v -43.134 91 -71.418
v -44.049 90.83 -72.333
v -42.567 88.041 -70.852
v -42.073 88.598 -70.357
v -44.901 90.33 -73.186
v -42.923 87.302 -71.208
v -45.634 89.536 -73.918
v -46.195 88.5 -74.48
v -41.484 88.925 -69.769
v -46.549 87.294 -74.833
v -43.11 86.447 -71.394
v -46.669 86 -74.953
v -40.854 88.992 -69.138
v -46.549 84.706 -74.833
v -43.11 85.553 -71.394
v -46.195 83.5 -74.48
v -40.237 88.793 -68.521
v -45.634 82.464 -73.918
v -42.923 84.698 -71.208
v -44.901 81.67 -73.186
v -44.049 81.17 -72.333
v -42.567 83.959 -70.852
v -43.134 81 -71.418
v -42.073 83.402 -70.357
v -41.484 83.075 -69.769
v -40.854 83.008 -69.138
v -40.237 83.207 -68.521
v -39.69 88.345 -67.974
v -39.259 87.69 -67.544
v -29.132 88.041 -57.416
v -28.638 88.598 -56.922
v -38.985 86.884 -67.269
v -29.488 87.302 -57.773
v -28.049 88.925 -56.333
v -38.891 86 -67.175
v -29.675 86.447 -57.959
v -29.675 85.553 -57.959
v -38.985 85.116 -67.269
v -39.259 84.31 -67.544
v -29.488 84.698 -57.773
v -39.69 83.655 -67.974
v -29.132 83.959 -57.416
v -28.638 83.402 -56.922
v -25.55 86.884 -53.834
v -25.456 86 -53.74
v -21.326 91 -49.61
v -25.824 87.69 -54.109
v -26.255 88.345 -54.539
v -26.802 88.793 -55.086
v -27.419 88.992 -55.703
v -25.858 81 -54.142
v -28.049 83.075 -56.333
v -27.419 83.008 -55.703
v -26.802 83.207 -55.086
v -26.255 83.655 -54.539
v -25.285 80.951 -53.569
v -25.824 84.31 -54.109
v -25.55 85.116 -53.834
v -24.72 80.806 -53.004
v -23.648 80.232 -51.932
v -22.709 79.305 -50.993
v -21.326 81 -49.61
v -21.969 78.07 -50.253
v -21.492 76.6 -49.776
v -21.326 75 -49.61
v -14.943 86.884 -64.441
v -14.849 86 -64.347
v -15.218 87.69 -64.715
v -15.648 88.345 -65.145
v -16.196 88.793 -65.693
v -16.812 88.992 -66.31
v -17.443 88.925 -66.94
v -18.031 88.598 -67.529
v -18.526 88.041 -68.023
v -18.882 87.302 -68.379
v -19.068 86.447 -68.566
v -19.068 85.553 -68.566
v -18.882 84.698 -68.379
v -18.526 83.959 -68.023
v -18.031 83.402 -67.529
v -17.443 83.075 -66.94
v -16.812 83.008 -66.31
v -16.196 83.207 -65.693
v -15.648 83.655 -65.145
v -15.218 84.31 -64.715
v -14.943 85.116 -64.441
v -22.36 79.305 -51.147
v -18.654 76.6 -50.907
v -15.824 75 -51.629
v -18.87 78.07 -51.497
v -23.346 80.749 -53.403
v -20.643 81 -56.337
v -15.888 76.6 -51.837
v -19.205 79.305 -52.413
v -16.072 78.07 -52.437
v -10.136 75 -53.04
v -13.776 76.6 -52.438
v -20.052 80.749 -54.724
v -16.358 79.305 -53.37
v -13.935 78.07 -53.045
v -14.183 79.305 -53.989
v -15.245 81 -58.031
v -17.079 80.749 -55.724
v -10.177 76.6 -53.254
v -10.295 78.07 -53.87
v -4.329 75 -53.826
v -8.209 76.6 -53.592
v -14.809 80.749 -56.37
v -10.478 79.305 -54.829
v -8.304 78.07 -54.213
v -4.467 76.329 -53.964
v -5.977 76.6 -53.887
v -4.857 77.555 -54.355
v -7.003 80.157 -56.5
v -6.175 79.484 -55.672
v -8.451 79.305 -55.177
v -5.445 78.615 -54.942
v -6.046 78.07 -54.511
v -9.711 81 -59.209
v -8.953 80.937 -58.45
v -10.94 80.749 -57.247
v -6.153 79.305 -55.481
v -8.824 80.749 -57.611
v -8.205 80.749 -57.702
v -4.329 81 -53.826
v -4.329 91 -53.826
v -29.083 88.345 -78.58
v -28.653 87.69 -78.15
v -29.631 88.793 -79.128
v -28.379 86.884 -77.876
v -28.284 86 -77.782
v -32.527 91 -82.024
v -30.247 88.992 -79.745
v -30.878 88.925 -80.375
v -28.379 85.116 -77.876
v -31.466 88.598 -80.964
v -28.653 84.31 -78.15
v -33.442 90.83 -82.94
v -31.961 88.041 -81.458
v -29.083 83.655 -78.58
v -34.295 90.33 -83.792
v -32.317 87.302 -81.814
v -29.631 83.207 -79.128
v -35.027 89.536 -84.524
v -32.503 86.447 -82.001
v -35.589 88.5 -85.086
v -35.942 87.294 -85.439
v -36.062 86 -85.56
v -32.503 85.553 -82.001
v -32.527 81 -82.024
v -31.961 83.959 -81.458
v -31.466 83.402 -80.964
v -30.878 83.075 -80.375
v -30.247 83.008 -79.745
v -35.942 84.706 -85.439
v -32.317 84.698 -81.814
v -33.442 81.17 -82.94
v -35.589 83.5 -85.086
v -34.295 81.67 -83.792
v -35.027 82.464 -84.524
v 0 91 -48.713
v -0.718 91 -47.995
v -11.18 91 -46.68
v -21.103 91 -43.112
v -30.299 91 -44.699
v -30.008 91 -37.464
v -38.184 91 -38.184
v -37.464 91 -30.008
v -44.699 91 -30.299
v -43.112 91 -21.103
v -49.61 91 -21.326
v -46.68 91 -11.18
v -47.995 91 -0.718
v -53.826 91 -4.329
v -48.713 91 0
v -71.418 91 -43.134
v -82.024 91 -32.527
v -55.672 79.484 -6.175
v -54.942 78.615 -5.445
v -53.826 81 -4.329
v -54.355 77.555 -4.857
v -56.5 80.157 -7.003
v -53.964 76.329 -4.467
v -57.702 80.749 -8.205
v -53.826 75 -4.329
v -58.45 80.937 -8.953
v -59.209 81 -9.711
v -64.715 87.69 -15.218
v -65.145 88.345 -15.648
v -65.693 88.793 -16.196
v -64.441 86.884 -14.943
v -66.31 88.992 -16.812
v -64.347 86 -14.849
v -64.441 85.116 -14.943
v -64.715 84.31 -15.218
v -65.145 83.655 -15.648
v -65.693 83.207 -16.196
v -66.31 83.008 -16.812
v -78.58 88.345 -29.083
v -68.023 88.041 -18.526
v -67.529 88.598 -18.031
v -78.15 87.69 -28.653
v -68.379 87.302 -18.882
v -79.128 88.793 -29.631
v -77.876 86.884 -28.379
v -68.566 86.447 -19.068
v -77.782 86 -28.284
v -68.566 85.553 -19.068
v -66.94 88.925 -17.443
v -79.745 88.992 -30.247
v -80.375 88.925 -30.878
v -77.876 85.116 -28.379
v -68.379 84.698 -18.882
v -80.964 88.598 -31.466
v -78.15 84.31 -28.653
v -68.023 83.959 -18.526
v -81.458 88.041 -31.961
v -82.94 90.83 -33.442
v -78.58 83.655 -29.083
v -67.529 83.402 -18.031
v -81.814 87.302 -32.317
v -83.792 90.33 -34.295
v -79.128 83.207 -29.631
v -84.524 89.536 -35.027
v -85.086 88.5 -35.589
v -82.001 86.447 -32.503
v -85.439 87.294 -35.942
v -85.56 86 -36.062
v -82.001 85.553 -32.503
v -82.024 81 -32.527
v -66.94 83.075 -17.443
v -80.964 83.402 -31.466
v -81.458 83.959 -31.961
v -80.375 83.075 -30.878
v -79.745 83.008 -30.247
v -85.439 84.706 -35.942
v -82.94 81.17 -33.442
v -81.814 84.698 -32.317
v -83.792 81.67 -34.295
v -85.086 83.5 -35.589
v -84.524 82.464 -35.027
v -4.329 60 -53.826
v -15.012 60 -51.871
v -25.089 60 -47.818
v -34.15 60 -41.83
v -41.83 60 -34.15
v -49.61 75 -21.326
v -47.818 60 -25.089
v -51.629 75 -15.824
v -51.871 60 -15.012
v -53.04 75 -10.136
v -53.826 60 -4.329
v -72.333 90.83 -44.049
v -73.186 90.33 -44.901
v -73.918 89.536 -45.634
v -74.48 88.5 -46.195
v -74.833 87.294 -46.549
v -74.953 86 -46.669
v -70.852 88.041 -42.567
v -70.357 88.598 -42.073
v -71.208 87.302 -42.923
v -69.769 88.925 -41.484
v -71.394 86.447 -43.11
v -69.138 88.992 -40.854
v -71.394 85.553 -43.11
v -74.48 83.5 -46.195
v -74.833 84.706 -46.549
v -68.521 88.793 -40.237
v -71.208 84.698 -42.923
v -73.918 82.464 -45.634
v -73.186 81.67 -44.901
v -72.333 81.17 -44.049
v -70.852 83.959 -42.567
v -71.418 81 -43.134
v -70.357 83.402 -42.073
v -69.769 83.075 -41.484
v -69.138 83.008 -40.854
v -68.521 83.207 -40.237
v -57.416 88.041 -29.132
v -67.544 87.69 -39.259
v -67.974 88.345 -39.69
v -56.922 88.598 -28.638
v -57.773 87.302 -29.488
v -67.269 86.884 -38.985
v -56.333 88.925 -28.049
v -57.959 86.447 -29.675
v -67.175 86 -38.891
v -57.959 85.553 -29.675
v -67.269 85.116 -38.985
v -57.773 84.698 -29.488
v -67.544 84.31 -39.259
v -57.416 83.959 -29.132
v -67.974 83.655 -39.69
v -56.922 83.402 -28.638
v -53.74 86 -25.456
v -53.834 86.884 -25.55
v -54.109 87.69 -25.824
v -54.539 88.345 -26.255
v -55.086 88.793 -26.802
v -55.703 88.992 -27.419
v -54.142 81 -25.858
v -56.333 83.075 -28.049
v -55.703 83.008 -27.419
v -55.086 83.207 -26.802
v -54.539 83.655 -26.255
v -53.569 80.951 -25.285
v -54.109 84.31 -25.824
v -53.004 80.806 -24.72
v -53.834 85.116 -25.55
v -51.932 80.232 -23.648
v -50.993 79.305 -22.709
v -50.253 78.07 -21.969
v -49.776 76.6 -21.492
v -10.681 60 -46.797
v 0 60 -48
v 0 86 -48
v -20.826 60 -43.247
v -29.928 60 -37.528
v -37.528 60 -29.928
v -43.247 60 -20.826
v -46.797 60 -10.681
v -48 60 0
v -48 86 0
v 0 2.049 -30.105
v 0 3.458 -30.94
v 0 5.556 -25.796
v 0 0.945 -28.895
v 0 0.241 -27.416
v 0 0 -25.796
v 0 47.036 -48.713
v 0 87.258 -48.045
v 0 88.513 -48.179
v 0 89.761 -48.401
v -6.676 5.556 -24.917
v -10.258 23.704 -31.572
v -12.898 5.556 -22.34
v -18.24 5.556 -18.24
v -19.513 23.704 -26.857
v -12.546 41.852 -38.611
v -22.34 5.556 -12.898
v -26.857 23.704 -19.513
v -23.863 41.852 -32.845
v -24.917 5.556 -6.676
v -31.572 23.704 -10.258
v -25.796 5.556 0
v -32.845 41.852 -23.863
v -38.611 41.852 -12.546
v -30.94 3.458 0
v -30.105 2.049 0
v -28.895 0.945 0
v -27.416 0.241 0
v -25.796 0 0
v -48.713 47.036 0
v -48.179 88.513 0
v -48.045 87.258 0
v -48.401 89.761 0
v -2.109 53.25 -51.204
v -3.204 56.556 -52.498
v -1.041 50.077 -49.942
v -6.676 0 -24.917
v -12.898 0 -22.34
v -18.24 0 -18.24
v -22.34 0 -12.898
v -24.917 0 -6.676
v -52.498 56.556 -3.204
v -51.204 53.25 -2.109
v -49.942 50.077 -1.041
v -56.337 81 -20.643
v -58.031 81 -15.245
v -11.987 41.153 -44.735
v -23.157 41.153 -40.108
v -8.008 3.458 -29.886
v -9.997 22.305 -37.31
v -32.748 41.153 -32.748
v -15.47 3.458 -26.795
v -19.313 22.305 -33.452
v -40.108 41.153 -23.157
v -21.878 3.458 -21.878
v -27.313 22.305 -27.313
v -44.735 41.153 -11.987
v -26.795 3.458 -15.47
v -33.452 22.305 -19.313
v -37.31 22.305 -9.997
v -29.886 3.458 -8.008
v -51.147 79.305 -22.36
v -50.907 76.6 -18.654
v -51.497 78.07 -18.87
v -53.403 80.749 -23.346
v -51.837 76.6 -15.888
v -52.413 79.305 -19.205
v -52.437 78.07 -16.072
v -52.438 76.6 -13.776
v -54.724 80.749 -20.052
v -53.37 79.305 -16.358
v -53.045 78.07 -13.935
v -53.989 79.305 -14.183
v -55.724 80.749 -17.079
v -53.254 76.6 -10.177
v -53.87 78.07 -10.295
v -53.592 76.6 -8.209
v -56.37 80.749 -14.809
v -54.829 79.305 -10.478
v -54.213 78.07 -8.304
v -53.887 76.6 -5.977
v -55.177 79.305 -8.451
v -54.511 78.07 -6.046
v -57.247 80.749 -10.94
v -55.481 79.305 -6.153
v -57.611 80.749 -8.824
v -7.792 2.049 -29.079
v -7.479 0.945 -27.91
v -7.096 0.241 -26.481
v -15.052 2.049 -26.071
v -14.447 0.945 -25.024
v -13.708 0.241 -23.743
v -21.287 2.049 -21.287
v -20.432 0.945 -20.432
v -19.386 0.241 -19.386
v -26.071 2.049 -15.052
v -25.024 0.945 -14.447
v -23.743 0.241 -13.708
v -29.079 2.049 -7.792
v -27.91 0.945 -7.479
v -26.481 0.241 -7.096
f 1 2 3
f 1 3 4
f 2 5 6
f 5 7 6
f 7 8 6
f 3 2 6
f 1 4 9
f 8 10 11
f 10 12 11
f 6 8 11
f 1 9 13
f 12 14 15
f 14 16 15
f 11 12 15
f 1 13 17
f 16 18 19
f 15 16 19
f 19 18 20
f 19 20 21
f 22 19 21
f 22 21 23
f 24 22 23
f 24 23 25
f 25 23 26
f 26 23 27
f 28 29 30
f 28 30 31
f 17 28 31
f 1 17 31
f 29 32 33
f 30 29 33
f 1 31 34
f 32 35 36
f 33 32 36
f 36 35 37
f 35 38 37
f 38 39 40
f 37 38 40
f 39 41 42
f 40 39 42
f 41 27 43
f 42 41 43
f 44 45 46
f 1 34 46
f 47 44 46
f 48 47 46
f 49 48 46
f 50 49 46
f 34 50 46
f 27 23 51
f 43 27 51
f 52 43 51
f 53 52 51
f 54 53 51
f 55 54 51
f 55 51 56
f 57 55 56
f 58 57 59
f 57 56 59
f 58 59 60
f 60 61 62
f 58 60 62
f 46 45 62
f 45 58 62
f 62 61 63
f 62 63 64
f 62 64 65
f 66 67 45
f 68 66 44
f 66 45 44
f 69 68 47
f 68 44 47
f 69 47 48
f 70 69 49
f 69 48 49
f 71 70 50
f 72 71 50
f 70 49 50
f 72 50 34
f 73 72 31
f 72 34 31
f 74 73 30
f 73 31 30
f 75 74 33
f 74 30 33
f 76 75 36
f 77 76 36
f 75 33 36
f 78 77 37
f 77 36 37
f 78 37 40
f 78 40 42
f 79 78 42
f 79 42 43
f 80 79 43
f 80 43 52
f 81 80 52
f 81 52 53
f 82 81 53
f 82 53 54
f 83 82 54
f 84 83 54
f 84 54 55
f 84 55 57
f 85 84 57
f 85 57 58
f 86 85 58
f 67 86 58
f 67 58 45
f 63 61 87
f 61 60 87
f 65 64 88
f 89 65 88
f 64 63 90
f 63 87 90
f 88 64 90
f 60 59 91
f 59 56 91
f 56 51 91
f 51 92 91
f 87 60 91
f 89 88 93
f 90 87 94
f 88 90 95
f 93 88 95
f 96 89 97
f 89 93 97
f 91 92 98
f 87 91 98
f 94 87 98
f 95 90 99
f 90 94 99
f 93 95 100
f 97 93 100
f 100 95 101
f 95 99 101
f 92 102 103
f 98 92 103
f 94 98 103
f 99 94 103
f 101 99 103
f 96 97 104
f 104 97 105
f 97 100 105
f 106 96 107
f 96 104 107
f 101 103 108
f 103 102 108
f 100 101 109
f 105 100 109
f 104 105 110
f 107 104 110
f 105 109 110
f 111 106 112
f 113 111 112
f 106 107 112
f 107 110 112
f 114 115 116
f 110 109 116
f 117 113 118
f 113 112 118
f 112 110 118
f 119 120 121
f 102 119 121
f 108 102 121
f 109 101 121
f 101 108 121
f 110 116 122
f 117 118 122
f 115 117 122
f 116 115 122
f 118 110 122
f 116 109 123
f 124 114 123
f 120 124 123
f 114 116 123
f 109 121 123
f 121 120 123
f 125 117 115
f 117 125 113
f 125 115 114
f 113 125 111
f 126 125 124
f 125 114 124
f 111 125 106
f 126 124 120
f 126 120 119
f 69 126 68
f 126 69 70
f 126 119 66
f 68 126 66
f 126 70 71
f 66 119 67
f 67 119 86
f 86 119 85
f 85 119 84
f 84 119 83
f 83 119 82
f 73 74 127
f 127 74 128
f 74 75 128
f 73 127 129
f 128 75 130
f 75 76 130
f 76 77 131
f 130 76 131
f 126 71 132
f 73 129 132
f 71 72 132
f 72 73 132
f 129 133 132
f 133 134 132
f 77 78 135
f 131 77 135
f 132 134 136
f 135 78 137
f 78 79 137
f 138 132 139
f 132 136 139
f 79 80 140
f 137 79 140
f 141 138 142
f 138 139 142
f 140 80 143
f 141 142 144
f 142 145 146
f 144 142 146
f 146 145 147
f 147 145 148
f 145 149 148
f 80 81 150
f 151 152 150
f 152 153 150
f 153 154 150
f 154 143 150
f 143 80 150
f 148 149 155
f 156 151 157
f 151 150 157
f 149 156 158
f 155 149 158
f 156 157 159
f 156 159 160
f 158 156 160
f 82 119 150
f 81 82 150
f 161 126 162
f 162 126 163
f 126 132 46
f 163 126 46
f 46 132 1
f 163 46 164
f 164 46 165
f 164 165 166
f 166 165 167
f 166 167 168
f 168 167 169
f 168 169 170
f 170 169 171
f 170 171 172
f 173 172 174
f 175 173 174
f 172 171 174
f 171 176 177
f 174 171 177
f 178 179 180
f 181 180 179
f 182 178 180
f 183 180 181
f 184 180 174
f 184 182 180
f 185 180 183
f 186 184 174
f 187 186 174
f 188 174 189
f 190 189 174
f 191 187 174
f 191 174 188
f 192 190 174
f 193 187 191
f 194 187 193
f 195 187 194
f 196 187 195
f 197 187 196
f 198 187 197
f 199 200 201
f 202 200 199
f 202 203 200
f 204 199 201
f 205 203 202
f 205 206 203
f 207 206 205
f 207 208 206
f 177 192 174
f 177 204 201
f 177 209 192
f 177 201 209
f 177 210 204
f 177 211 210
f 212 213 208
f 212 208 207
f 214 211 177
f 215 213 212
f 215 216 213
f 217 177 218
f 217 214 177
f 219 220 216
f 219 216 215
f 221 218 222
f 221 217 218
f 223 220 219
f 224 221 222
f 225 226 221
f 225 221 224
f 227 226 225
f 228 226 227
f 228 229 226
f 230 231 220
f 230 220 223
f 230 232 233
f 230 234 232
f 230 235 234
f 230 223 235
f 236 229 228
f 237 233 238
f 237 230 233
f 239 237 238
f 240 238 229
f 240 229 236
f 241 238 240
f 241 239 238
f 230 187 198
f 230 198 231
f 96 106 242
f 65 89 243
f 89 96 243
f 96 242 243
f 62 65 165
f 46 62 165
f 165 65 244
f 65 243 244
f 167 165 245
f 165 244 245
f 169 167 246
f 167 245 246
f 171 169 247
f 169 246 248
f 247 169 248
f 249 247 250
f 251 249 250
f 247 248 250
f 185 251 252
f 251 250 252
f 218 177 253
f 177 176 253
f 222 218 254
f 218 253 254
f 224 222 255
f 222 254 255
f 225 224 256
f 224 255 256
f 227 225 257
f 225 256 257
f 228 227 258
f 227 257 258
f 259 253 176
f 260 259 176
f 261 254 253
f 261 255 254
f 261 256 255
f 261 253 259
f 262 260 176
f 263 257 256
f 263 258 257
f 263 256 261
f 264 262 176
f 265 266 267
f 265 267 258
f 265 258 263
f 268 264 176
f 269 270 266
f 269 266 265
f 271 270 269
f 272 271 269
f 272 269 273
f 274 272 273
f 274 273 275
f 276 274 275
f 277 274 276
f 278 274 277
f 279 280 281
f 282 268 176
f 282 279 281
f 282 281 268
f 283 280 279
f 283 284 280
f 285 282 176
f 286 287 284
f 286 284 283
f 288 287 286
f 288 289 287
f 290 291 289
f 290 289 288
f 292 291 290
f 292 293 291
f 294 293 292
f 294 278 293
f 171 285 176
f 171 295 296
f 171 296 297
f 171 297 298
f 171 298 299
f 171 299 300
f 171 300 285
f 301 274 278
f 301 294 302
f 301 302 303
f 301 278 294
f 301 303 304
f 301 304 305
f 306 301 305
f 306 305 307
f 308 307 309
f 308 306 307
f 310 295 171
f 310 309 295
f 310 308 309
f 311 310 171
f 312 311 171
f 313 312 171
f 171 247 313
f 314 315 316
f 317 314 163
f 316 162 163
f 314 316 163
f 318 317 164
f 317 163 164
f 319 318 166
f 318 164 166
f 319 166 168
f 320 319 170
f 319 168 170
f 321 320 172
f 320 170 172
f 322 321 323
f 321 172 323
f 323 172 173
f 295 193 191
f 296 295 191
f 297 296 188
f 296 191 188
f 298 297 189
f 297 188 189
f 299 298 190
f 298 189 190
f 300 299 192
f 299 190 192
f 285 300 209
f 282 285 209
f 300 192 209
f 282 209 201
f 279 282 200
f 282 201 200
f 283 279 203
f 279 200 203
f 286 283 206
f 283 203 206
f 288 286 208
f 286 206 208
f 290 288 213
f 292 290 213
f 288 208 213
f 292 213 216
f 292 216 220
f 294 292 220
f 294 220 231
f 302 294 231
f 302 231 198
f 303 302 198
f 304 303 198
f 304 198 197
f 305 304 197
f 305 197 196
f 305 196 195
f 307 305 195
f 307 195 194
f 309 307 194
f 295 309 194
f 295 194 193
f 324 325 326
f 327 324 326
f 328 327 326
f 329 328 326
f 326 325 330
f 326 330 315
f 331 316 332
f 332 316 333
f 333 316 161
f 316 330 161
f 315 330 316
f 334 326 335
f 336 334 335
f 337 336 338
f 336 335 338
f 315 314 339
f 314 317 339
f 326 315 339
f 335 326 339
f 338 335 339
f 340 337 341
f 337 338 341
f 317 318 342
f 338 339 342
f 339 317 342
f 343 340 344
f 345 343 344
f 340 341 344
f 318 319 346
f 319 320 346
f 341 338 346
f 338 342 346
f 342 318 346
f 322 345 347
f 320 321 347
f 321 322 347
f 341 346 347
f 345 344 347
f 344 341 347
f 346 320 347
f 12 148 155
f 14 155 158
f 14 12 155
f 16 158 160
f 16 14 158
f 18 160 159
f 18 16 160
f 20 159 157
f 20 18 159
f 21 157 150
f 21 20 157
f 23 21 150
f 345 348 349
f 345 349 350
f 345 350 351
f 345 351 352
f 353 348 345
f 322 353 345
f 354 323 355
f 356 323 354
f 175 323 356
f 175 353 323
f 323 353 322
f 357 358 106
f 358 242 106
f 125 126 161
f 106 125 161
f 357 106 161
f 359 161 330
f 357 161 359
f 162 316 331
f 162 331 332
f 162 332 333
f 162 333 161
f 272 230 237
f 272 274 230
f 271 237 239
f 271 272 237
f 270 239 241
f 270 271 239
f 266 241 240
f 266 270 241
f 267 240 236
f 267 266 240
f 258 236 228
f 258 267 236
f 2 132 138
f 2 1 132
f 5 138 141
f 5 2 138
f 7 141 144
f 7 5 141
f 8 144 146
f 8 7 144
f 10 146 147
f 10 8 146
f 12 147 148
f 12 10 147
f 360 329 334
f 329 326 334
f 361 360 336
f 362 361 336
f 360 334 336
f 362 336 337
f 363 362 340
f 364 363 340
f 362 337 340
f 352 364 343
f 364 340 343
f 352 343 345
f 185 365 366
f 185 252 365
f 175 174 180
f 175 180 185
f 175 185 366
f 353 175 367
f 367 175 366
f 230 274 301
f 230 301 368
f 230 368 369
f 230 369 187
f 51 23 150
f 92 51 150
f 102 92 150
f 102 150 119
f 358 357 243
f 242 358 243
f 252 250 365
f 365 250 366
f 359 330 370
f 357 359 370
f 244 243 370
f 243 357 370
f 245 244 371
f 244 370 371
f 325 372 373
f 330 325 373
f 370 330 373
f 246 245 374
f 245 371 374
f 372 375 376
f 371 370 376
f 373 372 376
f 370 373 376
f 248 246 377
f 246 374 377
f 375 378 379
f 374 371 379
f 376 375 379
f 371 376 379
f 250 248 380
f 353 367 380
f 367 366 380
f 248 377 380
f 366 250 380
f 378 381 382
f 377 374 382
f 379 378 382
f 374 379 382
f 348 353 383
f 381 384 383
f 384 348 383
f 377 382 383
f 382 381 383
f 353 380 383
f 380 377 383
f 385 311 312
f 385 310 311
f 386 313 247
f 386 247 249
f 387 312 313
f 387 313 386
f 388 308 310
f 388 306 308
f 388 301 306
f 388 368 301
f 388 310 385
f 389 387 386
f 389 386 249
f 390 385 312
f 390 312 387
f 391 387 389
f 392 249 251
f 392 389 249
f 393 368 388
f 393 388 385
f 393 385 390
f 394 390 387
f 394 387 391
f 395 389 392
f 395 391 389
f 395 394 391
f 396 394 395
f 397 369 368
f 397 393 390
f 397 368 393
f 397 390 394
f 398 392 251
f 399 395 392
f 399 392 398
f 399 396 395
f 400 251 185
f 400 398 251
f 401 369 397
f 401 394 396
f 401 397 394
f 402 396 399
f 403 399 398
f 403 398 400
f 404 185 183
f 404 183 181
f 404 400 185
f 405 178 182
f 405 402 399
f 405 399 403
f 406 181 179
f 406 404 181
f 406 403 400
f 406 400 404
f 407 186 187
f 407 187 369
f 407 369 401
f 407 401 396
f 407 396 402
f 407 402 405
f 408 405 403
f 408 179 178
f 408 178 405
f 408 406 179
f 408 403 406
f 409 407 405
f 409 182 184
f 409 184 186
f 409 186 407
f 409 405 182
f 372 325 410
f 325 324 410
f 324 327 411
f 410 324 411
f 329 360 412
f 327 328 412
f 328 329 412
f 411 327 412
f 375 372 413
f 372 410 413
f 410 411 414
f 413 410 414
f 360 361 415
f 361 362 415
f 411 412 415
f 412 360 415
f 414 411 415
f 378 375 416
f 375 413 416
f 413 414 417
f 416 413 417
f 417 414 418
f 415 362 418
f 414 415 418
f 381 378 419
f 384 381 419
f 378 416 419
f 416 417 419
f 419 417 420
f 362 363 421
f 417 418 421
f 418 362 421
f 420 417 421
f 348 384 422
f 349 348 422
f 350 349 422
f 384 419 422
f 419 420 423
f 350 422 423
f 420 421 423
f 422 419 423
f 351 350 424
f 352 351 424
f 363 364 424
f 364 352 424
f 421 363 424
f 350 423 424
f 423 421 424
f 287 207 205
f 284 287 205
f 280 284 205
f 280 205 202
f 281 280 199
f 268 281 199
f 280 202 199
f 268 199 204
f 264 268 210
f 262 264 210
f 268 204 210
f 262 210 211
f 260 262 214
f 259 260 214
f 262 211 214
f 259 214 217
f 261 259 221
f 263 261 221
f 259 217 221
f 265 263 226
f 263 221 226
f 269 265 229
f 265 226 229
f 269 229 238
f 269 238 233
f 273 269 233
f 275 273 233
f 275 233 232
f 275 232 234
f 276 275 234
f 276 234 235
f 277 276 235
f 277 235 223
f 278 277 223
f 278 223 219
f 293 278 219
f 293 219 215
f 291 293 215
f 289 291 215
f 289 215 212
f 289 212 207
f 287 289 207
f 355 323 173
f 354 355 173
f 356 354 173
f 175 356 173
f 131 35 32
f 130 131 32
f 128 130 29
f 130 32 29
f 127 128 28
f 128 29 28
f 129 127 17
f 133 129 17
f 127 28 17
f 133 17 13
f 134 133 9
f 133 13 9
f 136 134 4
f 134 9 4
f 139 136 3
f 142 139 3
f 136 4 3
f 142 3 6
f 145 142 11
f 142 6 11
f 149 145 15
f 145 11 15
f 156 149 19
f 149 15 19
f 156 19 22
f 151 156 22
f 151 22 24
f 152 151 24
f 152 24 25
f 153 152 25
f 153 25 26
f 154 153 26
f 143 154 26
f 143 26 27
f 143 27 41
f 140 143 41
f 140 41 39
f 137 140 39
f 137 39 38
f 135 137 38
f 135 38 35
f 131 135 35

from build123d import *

# Parameters (mm, degrees)
REVOLUCI_N1_ANGLE       = 90
SALIENTE_EXTRUIR1_START = -10
SALIENTE_EXTRUIR1_DEPTH = 10
REDONDEO1_R             = 6
CROQUIS5_R              = 3
CORTAR_EXTRUIR1_DEPTH   = 156.393050206
REDONDEO2_R             = 5
CORTAR_EXTRUIR3_DEPTH   = 157.140962122
CORTAR_EXTRUIR4_DEPTH   = 152.400132213


with BuildPart() as part:
    # Croquis3 → Revolución1 (revolve)
    with BuildSketch(Plane(origin=(0, 0, 0), x_dir=(0, 0, -1), z_dir=(1, 0, 0))):
        with BuildLine():
            Line((25.795554958, 0), (25.795554958, 5.555717972))
            Line((25.795554958, 5.555717972), (48, 60))
            Line((48, 60), (48, 91))
            Line((48, 91), (54, 91))
            Line((54, 91), (54, 60))
            Line((54, 60), (30.939888656, 3.457663399))
            ThreePointArc((30.939888656, 3.457663399), (28.894732485, 0.944741845), (25.795554958, 0))
        make_face()
    revolve(axis=Axis((0, 0, 0), (0, 1, 0)), revolution_arc=REVOLUCI_N1_ANGLE)

    # Croquis4 → Saliente-Extruir1 (add)
    with BuildSketch(Plane(origin=(0, 91, 0), x_dir=(1, 0, 0), z_dir=(0, 1, 0)).offset(SALIENTE_EXTRUIR1_START)):
        with BuildLine():
            Line((-85.559920524, 36.062445841), (-74.953318806, 46.669047558))
            Line((-74.953318806, 46.669047558), (-49.610431326, 21.326160078))
            ThreePointArc((-49.610431326, 21.326160078), (-52.411957015, 12.999490829), (-53.826220039, 4.328745356))
            Line((-53.826220039, 4.328745356), (-85.559920524, 36.062445841))
        make_face()
        with BuildLine():
            Line((-46.669047558, 74.953318806), (-21.326160078, 49.610431326))
            ThreePointArc((-21.326160078, 49.610431326), (-12.999490829, 52.411957015), (-4.328745356, 53.826220039))
            Line((-4.328745356, 53.826220039), (-36.062445841, 85.559920524))
            Line((-36.062445841, 85.559920524), (-46.669047558, 74.953318806))
        make_face()
    extrude(amount=SALIENTE_EXTRUIR1_DEPTH)

    # Redondeo1
    redondeo1_edges = [part.edges().sort_by_distance(p)[0] for p in [
        (-52.411957015, 81, -12.999490829),
        (-12.999490829, 81, -52.411957015),
    ]]
    fillet(redondeo1_edges, radius=REDONDEO1_R)

    # Croquis5 → Cortar-Extruir1 (cut, through all)
    with BuildSketch(Plane(origin=(-24.748737342, 0, 24.748737342), x_dir=(0.707106781186549, 0, 0.707106781186546), z_dir=(-0.707106781186546, 0, 0.707106781186549))):
        with Locations((-59, 86)):
            Circle(CROQUIS5_R)
        with Locations((-78, 86)):
            Circle(CROQUIS5_R)
    extrude(amount=-CORTAR_EXTRUIR1_DEPTH, mode=Mode.SUBTRACT)

    # Redondeo2
    redondeo2_edges = [part.edges().sort_by_distance(p)[0] for p in [
        (-80.256619665, 81, -41.365746699),
        (-41.365746699, 81, -80.256619665),
        (-80.256619665, 91, -41.365746699),
        (-41.365746699, 91, -80.256619665),
    ]]
    fillet(redondeo2_edges, radius=REDONDEO2_R - 0.0001)  # a hair under: the kernel refuses the full size

    # Croquis14 → Cortar-Extruir3 (cut, through all)
    with BuildSketch(Plane(origin=(27, 0, -27), x_dir=(-0.7071067811865492, 0, -0.7071067811865458), z_dir=(0.7071067811865458, 0, -0.7071067811865492))):
        with BuildLine():
            Line((34.445016975, 91), (33.941125497, 91))
            Line((33.941125497, 91), (33.941125497, 86))
            ThreePointArc((33.941125497, 86), (34.067416606, 88.512663259), (34.445016975, 91))
        make_face()
    extrude(amount=-CORTAR_EXTRUIR3_DEPTH, mode=Mode.SUBTRACT)

    # Croquis17 → Cortar-Extruir4 (cut, through all)
    with BuildSketch(Plane(origin=(0, 91, 0), x_dir=(1, 0, 0), z_dir=(0, 1, 0))):
        with BuildLine():
            Line((-4.328745356, 53.826220039), (0, 48.712610162))
            Line((0, 48.712610162), (0, 54))
            ThreePointArc((0, 54), (-2.1661161, 53.956537519), (-4.328745356, 53.826220039))
        make_face()
        with BuildLine():
            Line((-53.826220039, 4.328745356), (-48.712610162, 0))
            Line((-48.712610162, 0), (-54, 0))
            ThreePointArc((-54, 0), (-53.956537519, 2.1661161), (-53.826220039, 4.328745356))
        make_face()
    extrude(amount=-CORTAR_EXTRUIR4_DEPTH, mode=Mode.SUBTRACT)


solid = part.part
